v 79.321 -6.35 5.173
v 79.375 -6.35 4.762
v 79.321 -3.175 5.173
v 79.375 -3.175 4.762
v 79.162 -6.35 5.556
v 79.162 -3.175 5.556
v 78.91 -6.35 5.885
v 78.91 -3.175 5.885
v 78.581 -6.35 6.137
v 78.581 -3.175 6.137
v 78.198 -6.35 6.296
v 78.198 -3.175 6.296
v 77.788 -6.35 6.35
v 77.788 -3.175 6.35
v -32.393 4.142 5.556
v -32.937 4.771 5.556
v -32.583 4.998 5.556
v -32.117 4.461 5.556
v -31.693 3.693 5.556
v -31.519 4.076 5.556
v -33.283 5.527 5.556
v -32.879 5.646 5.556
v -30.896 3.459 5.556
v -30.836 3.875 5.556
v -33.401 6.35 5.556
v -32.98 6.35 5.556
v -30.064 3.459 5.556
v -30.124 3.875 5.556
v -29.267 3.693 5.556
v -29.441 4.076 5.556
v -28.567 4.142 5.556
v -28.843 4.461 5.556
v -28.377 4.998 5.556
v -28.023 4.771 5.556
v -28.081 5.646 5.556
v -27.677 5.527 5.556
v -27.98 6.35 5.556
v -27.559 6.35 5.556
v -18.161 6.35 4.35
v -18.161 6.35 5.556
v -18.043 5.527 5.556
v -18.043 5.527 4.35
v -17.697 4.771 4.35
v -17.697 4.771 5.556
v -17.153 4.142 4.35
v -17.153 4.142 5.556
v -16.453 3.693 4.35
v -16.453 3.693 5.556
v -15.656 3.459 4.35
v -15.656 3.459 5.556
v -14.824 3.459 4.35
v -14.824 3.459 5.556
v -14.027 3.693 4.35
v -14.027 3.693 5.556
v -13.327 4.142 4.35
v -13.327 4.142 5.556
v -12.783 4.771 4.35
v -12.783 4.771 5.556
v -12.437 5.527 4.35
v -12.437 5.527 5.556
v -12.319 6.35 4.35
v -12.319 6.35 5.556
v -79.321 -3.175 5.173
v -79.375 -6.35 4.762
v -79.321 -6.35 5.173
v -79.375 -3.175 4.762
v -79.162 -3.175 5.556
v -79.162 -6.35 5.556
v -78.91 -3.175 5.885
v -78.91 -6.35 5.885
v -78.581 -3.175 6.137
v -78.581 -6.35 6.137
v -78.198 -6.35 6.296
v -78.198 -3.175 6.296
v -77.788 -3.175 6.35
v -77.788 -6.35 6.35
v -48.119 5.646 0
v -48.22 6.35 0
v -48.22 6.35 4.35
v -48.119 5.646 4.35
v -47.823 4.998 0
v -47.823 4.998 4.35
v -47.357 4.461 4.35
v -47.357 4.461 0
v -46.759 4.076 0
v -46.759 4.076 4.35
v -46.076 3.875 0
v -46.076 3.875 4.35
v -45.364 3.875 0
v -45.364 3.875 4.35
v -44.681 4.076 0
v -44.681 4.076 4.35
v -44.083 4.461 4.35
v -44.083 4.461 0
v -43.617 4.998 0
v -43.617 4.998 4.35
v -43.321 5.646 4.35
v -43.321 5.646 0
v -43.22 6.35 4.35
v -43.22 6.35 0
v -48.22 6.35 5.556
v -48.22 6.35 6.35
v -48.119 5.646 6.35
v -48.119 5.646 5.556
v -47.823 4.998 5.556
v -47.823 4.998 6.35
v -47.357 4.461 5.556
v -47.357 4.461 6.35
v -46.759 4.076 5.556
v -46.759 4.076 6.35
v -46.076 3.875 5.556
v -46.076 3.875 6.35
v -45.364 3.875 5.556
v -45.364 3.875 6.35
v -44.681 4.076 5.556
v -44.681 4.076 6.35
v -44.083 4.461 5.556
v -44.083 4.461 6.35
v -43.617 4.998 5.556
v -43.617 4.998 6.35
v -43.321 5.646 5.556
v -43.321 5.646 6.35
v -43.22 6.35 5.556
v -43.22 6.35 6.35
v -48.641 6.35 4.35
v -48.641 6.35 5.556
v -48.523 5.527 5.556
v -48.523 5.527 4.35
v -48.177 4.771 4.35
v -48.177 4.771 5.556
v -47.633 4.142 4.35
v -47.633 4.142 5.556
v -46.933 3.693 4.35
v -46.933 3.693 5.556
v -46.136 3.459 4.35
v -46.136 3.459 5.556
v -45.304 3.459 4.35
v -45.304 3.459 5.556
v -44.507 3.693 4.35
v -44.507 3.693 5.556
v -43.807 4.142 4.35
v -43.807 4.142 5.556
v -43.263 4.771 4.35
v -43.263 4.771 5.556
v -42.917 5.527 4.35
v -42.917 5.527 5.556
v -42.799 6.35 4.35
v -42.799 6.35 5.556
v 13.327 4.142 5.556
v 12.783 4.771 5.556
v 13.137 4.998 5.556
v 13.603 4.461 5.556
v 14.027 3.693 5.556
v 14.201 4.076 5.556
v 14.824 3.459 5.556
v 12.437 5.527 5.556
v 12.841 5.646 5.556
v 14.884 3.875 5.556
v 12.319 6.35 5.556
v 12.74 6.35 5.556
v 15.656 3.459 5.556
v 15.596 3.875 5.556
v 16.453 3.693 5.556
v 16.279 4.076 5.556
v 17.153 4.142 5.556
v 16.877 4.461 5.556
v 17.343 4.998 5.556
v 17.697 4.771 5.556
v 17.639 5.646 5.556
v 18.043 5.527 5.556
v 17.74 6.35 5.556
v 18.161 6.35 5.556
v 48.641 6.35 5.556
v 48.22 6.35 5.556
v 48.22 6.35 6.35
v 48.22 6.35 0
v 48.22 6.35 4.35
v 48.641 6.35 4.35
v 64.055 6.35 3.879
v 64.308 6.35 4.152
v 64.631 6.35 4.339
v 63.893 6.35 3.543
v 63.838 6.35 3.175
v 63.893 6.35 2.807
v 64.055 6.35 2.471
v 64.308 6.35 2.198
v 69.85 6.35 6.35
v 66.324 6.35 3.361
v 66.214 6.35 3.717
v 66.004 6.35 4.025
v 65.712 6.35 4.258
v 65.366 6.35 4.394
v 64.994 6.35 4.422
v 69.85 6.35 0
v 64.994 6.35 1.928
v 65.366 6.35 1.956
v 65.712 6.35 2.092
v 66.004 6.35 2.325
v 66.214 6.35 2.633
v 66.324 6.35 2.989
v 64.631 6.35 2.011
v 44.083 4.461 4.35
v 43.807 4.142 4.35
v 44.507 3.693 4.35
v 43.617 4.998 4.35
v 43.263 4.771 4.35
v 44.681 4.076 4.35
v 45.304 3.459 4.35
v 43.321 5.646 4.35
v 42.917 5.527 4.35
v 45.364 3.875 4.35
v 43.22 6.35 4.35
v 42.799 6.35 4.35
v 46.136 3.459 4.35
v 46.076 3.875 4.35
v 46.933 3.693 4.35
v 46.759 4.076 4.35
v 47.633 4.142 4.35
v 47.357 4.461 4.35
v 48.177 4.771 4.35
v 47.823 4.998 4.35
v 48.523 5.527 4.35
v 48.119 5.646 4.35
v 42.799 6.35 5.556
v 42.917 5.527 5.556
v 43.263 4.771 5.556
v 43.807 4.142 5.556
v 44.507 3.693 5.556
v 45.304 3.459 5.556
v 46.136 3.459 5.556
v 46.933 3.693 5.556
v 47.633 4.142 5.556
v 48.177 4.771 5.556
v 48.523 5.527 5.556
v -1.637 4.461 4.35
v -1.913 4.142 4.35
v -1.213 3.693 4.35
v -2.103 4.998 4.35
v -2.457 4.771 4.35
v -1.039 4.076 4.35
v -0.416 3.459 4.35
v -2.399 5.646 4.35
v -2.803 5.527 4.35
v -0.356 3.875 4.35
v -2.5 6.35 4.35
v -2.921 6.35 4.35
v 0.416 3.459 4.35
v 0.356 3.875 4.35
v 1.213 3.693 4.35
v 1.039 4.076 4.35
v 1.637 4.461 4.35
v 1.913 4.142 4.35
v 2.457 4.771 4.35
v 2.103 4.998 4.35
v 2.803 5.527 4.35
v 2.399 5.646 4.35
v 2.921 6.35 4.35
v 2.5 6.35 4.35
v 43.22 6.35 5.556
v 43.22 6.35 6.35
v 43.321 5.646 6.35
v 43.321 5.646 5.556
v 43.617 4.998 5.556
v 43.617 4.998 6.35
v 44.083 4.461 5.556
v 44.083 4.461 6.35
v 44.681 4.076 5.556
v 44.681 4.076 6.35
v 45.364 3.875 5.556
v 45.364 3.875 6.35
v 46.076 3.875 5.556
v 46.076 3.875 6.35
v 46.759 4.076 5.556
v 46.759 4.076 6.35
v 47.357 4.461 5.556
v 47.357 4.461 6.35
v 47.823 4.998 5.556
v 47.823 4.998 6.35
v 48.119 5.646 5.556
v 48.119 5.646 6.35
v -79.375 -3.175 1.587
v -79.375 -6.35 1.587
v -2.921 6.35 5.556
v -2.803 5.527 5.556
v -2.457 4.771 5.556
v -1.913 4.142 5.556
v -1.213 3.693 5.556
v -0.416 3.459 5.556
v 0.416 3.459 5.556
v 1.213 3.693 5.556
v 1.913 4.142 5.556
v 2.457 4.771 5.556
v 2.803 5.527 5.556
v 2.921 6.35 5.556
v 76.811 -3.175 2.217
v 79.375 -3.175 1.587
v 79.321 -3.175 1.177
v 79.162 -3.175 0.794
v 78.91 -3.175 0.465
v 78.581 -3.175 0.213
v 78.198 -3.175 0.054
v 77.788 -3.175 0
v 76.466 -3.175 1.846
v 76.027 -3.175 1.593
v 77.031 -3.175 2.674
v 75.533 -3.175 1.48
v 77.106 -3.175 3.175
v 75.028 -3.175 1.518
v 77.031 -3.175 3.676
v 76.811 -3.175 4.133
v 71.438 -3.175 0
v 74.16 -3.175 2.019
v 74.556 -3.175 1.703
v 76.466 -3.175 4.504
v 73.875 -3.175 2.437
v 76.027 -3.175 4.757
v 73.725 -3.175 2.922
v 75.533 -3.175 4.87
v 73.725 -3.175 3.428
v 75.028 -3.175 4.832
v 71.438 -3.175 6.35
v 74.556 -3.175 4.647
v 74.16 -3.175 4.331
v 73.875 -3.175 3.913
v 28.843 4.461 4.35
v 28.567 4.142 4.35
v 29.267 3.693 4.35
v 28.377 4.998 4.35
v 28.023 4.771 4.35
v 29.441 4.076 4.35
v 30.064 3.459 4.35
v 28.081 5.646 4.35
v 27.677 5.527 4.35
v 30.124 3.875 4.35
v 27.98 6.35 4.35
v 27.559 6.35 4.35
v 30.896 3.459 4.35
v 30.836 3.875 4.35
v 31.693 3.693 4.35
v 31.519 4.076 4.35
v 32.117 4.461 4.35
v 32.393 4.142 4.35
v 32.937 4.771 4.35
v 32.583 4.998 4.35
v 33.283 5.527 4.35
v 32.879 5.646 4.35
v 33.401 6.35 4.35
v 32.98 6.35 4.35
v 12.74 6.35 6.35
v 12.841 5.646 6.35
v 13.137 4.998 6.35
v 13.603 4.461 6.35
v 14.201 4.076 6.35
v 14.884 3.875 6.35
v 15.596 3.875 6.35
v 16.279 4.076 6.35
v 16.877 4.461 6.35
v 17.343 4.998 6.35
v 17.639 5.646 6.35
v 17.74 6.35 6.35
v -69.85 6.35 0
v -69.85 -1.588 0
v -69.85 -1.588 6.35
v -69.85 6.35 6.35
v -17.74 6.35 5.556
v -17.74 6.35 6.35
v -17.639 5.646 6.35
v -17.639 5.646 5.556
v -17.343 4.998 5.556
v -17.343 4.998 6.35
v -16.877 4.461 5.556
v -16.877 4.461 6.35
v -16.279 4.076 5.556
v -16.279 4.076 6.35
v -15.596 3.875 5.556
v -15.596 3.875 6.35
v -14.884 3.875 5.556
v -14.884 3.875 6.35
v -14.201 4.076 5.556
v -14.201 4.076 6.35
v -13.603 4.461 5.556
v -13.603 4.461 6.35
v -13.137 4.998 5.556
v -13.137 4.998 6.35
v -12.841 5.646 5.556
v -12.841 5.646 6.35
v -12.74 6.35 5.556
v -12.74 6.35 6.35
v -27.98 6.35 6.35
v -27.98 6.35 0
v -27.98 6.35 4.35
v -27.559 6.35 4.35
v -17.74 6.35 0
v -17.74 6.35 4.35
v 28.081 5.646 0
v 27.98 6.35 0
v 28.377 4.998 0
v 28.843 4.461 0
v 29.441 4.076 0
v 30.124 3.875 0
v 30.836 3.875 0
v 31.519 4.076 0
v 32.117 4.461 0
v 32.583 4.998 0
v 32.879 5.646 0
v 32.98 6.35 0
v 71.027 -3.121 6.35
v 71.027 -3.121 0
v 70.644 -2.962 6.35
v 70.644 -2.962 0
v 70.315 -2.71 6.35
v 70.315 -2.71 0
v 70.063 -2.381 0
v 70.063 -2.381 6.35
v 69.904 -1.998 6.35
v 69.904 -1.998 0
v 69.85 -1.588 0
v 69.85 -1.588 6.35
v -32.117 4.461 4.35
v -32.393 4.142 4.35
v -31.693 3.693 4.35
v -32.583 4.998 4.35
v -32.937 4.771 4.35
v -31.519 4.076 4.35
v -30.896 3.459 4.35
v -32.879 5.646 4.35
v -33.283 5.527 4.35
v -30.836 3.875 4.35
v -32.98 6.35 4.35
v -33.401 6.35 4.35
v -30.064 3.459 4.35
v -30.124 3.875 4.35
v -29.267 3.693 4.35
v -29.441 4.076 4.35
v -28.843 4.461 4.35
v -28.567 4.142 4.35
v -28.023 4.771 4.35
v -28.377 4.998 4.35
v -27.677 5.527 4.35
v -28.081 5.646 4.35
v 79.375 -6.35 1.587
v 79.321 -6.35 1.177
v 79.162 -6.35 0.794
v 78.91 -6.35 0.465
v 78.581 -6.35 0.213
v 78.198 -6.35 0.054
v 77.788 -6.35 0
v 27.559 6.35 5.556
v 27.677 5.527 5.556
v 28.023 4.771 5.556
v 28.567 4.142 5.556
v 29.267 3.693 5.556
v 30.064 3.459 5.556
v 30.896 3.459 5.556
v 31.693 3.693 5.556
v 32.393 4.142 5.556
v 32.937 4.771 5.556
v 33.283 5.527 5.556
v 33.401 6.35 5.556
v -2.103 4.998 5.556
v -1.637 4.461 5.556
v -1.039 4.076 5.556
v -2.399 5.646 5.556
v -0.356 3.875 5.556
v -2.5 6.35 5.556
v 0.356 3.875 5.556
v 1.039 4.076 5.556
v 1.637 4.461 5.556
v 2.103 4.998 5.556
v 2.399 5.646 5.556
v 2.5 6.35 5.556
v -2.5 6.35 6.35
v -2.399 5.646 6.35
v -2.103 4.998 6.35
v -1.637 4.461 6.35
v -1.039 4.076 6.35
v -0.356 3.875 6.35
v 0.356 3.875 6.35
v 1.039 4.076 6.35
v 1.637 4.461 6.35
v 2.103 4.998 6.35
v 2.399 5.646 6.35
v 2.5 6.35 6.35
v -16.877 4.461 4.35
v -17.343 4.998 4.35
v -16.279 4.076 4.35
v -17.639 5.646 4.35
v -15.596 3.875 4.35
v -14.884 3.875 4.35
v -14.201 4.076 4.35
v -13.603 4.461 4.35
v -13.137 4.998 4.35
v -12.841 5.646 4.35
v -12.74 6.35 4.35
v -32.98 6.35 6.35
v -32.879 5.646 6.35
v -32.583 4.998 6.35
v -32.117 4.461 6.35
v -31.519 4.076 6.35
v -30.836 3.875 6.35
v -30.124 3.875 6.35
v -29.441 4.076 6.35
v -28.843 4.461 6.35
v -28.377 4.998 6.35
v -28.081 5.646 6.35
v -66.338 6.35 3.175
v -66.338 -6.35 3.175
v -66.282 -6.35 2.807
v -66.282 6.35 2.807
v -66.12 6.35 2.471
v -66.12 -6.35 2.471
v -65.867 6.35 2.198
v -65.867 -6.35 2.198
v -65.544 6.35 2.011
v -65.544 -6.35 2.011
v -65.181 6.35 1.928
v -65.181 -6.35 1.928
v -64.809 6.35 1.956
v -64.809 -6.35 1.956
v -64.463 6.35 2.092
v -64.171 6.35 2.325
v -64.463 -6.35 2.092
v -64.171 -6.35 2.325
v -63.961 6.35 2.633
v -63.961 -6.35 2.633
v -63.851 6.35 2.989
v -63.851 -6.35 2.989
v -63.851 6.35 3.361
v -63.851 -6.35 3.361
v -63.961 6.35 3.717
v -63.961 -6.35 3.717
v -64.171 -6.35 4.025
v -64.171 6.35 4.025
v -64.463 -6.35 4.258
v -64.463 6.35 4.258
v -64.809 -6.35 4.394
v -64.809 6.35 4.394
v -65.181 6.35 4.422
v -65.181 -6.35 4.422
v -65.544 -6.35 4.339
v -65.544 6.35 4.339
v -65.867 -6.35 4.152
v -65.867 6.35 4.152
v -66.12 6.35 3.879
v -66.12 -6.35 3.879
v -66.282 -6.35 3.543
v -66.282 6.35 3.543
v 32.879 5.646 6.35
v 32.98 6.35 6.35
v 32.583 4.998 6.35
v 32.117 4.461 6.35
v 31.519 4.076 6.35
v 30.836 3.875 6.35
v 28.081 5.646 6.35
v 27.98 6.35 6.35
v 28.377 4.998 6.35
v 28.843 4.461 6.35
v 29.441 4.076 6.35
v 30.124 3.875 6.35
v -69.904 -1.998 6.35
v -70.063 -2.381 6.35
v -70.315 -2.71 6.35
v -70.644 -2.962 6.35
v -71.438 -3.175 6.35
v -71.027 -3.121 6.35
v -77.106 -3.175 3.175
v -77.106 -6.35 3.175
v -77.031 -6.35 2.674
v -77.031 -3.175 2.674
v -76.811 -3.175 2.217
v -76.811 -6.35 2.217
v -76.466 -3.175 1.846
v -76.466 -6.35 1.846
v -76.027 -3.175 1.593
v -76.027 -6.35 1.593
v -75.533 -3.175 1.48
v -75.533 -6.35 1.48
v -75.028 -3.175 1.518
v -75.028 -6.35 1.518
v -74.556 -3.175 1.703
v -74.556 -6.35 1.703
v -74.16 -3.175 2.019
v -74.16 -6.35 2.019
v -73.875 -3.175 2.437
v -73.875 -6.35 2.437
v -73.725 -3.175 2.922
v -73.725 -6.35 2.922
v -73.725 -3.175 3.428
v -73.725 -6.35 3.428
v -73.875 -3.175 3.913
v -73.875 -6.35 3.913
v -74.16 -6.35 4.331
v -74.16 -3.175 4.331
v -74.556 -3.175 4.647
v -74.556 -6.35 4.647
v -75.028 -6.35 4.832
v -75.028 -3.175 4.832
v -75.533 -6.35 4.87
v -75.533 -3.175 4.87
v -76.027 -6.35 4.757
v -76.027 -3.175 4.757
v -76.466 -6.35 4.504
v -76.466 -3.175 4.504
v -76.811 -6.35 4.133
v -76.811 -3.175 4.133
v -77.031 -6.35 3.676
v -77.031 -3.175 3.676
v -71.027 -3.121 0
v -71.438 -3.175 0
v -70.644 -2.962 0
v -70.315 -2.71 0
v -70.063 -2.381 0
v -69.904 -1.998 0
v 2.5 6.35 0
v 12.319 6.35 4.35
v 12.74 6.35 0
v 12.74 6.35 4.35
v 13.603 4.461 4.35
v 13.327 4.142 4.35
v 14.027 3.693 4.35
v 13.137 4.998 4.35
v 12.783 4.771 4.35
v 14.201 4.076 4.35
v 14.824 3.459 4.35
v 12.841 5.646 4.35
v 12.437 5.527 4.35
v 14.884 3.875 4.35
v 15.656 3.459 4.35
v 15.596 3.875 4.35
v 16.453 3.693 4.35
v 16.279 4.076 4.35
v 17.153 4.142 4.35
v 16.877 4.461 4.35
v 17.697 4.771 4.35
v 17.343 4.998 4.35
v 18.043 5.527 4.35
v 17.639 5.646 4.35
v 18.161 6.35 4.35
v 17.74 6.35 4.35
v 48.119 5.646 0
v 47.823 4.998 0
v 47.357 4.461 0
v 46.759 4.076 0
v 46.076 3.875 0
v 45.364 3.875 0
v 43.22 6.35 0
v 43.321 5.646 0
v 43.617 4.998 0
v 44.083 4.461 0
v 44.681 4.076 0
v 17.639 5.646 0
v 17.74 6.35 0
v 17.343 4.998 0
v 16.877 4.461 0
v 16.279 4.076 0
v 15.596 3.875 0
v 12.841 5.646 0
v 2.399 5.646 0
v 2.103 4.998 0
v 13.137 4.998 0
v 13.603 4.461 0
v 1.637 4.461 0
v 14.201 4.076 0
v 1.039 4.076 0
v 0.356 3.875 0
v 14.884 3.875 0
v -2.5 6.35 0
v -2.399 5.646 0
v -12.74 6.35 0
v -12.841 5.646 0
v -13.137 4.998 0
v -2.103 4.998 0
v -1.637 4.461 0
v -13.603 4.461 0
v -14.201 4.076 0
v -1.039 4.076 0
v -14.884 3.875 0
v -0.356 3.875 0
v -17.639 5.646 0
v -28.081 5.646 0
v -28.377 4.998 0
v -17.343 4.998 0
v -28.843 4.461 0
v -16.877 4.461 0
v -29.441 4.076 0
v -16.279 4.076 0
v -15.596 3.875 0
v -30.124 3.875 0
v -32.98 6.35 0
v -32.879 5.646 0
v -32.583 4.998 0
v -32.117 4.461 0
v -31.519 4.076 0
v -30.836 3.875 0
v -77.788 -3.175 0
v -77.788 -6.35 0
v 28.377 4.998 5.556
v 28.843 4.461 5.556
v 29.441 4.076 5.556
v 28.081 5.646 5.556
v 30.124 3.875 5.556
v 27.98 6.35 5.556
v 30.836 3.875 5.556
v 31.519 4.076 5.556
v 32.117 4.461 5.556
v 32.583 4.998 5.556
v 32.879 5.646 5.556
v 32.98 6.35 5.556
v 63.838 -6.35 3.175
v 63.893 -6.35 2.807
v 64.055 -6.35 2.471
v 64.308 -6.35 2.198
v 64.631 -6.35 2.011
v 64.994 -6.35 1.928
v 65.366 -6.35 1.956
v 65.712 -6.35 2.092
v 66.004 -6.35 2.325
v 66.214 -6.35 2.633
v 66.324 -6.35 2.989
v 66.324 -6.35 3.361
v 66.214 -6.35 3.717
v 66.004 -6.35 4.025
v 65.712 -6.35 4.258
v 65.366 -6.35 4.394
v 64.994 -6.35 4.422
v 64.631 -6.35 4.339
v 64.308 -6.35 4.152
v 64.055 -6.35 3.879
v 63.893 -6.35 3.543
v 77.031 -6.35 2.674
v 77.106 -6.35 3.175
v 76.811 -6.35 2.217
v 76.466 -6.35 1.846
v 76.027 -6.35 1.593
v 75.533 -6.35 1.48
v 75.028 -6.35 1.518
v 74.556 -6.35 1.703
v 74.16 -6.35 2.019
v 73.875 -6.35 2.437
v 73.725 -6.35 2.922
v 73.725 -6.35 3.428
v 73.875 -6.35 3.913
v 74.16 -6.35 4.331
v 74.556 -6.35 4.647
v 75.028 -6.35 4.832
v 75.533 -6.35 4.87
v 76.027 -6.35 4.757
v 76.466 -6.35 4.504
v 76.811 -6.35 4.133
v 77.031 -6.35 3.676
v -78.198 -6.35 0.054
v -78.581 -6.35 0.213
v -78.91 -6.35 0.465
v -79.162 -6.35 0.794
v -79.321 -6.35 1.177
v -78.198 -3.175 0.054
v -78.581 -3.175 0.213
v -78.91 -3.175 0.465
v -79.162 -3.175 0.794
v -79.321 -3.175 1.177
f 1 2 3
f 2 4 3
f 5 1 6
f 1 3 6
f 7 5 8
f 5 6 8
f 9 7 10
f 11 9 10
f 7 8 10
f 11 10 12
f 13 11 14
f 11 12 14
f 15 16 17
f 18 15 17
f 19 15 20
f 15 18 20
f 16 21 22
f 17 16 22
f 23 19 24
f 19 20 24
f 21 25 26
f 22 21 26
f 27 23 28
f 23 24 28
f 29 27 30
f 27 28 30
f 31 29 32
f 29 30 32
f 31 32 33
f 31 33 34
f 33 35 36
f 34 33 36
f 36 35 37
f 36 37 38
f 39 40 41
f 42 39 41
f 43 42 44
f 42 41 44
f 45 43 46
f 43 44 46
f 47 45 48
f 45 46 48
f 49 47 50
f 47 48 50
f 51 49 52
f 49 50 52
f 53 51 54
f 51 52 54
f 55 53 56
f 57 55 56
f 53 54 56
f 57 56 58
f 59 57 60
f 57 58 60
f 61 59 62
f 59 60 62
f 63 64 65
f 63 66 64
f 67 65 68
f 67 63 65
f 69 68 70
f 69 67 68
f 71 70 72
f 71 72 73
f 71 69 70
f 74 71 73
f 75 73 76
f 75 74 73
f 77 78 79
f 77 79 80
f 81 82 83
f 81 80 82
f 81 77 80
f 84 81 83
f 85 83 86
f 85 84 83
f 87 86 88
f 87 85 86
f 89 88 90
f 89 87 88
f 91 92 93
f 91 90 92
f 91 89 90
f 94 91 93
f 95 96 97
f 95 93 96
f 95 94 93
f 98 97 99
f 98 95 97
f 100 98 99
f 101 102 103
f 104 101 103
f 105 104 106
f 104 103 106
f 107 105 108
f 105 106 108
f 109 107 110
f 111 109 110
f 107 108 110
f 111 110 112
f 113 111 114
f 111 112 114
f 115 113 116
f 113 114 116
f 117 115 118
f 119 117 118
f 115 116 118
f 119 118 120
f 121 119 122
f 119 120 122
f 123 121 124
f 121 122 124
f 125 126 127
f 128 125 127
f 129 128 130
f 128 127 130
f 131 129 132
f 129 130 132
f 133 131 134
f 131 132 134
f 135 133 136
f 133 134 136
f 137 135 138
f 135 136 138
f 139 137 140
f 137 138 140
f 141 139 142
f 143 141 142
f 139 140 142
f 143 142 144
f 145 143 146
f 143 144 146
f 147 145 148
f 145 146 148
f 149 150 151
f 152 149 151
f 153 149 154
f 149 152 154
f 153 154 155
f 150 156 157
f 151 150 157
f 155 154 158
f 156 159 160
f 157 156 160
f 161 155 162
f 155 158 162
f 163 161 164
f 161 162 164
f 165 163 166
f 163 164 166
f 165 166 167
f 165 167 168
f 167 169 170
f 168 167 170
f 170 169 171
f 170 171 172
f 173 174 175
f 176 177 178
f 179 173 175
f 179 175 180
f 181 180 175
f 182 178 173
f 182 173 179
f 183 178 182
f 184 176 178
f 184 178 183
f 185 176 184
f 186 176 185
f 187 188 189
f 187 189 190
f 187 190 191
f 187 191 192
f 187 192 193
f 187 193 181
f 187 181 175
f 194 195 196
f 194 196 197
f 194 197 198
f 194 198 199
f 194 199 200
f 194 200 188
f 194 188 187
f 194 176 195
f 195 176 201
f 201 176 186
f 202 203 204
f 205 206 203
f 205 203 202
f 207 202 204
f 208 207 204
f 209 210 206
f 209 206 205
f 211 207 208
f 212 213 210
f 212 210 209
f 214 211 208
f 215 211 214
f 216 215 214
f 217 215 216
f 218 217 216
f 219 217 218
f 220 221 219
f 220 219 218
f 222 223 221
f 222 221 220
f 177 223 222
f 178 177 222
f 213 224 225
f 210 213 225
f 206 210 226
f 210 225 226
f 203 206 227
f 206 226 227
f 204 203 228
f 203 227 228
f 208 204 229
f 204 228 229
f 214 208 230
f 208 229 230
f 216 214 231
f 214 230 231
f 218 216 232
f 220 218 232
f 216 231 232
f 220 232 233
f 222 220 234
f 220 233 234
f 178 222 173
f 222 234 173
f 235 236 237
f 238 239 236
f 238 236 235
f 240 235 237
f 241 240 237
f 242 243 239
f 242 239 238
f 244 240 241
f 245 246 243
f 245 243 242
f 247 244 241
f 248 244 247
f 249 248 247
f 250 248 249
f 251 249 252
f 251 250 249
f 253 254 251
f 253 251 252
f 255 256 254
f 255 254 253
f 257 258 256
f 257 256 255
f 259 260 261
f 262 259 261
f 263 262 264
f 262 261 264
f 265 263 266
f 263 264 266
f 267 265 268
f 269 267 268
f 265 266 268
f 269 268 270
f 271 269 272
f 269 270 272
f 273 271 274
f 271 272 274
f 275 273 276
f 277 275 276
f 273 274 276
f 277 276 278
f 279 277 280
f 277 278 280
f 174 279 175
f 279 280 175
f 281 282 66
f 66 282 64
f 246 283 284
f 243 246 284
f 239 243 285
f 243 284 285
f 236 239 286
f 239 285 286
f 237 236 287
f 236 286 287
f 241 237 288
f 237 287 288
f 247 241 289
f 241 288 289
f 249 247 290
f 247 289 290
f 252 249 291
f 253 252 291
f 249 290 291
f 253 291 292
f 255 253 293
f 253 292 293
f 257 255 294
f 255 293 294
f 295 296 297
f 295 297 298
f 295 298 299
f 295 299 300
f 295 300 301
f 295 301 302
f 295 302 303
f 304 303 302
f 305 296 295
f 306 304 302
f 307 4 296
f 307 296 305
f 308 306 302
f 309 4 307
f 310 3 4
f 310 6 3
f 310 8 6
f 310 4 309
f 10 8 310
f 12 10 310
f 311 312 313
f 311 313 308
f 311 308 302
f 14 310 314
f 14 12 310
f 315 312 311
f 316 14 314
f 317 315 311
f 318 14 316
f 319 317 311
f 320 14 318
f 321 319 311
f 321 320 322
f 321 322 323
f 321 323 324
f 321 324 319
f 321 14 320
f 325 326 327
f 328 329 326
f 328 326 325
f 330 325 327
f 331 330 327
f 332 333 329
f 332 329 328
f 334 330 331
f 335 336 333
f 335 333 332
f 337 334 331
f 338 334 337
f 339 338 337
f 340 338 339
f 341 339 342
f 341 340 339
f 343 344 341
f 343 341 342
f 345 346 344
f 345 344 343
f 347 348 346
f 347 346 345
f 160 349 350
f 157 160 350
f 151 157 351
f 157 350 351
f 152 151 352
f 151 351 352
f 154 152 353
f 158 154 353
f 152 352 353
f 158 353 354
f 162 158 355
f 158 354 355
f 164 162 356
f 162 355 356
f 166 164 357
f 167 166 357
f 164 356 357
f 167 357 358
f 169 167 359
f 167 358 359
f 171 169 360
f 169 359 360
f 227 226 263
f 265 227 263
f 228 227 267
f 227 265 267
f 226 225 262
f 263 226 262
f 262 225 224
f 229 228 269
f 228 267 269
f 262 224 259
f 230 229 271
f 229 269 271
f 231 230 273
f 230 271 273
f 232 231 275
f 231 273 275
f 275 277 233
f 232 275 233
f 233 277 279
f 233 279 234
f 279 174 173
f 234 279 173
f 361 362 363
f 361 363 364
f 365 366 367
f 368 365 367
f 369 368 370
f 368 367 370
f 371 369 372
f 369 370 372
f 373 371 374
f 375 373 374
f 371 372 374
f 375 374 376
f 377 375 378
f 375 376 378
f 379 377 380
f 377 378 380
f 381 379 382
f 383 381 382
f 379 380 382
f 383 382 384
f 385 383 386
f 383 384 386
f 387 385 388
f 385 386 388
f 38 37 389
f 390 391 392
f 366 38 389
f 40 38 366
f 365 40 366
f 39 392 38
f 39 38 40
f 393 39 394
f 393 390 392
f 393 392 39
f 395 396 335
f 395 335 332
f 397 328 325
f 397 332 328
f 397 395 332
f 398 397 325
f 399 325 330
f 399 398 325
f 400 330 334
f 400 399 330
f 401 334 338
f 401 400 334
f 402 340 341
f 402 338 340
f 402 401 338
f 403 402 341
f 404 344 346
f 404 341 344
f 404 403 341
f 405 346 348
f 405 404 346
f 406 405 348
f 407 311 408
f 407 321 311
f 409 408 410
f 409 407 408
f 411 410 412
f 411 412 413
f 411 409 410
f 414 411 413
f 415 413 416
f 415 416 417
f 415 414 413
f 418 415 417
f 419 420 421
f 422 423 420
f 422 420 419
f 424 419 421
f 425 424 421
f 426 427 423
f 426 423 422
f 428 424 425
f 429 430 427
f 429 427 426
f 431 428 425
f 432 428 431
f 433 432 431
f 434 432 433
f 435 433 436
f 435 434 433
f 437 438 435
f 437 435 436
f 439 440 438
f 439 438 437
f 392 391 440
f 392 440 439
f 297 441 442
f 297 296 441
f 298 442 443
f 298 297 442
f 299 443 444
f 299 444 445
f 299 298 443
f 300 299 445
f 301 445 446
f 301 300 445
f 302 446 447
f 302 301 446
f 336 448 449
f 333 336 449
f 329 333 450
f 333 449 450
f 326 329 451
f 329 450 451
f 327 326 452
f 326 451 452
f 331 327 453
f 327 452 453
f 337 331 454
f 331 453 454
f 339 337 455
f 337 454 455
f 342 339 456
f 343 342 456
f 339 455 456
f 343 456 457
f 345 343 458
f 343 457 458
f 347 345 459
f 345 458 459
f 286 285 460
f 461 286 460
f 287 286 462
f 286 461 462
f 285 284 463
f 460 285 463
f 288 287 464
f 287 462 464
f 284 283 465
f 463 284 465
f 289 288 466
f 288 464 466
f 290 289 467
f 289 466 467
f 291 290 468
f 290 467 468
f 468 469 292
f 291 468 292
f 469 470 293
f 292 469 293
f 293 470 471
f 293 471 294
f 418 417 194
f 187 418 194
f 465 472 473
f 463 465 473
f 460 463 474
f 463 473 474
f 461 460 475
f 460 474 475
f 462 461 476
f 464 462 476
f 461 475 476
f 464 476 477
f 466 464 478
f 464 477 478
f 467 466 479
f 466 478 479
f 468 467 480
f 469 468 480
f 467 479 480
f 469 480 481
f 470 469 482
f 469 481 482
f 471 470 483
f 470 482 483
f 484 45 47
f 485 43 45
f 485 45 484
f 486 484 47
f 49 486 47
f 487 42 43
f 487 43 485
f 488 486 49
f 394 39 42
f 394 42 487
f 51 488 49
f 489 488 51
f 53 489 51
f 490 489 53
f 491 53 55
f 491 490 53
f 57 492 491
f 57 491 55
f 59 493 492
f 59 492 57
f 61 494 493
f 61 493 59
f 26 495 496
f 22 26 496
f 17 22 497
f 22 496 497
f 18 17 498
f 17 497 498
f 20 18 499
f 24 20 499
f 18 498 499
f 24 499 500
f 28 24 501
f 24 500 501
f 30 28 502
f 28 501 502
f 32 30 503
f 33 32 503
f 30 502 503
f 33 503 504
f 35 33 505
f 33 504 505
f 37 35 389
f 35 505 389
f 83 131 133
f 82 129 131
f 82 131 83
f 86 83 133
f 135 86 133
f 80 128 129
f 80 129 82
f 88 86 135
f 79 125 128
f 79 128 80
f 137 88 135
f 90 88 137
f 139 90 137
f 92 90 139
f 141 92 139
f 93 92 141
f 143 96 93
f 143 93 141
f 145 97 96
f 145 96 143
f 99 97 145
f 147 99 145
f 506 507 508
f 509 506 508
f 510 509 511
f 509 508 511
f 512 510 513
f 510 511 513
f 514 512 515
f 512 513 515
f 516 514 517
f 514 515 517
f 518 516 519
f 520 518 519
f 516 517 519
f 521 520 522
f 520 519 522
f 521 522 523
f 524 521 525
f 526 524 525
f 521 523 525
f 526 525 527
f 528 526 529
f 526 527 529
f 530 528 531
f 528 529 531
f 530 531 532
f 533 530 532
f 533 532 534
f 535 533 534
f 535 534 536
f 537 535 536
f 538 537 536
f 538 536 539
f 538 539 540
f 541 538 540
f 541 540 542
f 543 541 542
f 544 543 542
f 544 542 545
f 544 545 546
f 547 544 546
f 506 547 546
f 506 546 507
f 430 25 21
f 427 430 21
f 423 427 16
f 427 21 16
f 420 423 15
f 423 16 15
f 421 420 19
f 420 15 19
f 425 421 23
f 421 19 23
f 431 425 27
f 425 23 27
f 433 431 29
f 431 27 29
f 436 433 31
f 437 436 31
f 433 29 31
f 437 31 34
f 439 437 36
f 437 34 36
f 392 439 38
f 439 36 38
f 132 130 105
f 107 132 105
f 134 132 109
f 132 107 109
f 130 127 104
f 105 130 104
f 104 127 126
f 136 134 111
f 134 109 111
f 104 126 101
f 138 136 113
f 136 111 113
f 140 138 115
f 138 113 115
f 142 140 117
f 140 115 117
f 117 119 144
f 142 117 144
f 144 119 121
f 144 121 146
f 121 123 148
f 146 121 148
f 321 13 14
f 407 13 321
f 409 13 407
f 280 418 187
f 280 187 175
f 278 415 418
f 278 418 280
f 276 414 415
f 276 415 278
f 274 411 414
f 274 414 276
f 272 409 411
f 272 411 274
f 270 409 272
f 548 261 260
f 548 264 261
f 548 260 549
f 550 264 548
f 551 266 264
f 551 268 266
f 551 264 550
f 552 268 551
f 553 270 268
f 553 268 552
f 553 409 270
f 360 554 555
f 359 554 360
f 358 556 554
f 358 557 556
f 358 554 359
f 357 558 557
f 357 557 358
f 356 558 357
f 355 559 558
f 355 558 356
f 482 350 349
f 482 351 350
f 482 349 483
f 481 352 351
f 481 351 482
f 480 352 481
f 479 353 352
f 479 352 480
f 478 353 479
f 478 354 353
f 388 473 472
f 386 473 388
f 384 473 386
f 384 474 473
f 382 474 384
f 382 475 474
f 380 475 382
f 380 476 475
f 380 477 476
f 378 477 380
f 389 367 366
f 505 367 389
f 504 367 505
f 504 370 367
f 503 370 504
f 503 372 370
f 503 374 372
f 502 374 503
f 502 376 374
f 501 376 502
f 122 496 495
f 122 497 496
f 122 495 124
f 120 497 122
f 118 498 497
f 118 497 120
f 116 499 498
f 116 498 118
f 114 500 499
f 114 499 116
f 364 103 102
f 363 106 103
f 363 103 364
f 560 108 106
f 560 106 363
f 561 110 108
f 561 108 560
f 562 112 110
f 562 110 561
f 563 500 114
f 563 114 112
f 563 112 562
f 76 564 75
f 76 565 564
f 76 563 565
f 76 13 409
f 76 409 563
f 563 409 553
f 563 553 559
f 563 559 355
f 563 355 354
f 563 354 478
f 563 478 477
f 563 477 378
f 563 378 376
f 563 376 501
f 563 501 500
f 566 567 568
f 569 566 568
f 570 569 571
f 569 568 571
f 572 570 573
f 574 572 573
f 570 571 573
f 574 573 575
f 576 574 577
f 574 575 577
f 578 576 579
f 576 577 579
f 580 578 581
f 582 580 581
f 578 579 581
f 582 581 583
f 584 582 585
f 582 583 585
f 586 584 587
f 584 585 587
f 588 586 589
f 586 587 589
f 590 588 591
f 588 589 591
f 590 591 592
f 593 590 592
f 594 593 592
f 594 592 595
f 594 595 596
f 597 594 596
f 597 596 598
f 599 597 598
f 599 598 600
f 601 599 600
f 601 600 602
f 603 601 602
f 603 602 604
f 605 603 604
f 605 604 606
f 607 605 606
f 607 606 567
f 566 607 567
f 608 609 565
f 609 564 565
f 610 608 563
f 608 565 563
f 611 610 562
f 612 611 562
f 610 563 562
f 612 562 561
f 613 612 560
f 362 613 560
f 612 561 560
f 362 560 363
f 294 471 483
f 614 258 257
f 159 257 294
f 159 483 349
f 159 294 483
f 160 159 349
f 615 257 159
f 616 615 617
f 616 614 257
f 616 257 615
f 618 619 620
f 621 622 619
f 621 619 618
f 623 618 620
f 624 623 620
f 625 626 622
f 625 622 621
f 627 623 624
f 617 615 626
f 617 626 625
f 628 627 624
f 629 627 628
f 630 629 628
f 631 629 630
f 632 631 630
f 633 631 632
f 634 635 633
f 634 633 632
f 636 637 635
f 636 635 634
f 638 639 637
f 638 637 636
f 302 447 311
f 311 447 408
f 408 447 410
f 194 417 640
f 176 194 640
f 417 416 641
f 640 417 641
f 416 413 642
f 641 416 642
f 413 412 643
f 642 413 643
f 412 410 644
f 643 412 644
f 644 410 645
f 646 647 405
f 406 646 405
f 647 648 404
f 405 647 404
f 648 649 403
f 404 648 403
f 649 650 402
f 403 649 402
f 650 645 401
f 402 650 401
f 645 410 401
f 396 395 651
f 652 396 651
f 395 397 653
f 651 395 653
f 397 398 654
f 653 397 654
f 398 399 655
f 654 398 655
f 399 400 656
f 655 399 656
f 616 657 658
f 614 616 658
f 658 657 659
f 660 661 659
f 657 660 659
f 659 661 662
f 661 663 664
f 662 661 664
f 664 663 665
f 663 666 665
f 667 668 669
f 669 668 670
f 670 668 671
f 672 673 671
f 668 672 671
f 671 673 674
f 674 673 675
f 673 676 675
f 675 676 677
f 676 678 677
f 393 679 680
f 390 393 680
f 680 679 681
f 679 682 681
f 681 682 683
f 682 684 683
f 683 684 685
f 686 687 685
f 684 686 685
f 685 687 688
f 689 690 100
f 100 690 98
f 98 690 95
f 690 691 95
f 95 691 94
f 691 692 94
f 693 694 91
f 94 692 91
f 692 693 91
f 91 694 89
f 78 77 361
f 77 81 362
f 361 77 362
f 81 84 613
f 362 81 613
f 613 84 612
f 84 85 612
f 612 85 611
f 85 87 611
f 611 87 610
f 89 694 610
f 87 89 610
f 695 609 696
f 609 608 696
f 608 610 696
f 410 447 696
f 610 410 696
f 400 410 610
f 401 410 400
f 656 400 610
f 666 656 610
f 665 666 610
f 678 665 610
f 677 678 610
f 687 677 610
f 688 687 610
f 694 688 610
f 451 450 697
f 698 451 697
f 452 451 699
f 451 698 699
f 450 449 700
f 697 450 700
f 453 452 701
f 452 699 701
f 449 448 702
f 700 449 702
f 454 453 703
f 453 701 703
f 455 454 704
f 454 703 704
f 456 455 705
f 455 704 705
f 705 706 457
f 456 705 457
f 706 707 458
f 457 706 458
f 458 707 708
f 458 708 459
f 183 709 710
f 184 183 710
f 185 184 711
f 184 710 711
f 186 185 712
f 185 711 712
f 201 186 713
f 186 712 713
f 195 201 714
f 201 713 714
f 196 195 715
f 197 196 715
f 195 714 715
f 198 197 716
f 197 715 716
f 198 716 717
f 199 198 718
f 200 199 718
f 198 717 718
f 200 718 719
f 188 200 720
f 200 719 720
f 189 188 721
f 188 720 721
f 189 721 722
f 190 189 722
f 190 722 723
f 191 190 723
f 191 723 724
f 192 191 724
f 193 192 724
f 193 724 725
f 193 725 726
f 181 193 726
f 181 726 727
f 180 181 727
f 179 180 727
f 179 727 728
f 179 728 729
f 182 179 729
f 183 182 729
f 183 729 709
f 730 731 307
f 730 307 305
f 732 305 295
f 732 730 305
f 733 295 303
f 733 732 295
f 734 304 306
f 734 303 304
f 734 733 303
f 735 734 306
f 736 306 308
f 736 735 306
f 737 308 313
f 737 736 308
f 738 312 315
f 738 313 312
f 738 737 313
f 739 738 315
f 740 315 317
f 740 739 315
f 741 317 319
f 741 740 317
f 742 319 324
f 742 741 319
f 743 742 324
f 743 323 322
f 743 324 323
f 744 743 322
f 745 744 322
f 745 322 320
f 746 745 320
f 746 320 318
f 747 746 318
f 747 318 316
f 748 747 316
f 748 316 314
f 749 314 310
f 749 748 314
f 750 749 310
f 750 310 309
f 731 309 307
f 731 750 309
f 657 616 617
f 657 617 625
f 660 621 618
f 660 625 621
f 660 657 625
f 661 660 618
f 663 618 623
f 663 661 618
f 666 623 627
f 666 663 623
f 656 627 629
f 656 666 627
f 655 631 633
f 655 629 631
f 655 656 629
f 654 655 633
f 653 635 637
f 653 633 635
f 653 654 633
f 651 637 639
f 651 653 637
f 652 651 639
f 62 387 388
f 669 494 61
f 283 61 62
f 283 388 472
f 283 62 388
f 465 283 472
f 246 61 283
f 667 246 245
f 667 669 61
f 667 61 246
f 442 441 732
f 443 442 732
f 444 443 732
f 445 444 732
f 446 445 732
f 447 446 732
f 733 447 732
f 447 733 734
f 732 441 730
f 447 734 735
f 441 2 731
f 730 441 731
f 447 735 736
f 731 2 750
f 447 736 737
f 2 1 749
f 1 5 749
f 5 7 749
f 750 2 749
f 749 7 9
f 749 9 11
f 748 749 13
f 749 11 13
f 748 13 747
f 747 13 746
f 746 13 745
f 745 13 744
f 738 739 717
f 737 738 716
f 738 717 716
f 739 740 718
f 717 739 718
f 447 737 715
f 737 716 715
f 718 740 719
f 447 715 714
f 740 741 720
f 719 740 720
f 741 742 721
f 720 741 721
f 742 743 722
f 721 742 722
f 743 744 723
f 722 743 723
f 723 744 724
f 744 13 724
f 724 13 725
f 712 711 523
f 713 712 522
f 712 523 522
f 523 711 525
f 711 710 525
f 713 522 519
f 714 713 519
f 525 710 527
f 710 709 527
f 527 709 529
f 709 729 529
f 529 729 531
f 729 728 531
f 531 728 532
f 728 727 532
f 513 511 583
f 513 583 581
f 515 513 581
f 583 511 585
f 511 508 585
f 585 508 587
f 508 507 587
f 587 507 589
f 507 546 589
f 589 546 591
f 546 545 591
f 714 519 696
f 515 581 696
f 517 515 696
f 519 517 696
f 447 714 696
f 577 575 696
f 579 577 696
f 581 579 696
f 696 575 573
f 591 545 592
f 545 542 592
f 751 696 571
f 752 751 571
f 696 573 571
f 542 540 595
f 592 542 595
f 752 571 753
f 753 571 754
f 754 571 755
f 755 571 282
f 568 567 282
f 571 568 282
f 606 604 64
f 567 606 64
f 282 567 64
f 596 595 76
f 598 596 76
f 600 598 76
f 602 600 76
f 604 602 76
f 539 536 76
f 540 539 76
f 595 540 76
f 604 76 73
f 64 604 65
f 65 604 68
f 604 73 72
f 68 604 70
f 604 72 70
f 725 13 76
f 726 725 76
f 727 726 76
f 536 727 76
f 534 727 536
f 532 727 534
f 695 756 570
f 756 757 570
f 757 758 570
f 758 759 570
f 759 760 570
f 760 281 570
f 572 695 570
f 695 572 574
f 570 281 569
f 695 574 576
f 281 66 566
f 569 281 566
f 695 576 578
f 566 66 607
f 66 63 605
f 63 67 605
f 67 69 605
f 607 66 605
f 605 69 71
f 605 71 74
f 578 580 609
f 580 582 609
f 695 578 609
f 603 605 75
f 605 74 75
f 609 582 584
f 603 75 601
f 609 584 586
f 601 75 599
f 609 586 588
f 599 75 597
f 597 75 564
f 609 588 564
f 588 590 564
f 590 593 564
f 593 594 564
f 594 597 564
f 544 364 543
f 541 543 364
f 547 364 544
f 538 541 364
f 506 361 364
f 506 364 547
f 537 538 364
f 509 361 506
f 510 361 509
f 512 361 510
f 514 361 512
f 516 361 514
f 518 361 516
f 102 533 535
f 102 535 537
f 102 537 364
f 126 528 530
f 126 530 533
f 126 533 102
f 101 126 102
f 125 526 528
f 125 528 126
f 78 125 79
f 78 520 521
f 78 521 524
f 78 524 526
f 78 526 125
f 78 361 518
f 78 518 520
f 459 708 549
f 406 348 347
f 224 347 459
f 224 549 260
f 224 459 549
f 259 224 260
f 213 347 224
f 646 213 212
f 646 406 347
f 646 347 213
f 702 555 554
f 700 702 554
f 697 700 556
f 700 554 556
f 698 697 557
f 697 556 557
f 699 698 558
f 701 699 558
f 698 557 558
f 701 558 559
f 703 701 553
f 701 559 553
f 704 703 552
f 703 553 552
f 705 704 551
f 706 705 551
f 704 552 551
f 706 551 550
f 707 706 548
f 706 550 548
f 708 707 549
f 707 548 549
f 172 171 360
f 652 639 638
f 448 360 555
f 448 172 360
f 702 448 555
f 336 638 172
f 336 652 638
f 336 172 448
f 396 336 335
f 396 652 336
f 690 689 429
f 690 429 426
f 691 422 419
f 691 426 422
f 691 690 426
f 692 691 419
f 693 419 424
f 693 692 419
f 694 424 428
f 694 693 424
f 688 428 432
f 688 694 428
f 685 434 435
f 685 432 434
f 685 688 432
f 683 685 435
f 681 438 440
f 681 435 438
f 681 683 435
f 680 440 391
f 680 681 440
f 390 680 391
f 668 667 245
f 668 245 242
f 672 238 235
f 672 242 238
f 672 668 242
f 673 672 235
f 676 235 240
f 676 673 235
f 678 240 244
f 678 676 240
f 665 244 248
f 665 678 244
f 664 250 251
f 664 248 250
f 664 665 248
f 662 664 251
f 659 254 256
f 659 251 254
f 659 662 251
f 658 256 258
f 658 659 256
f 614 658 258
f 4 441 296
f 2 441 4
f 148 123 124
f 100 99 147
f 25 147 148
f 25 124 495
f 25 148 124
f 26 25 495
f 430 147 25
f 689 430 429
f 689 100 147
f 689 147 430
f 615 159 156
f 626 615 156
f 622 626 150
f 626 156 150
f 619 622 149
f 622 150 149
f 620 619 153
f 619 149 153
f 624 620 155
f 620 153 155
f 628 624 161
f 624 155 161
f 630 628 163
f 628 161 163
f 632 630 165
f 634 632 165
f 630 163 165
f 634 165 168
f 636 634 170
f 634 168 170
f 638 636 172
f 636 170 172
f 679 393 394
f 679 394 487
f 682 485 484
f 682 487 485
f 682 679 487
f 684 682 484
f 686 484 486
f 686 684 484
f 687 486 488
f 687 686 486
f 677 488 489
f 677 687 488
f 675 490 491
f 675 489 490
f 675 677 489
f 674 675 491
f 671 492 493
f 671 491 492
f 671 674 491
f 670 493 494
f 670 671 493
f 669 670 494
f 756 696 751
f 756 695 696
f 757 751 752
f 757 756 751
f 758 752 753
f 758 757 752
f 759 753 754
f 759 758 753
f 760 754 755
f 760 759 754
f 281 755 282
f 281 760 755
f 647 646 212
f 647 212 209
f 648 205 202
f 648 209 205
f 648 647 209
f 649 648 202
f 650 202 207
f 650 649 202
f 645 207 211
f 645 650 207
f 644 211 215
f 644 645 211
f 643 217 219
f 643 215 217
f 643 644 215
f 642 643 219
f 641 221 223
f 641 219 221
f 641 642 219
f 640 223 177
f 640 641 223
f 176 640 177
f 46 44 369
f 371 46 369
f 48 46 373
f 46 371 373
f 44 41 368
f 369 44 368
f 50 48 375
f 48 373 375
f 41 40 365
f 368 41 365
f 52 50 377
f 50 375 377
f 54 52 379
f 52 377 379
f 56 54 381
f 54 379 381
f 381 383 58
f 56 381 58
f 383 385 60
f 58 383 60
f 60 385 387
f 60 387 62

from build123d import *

# Parameters (mm, degrees)
SKETCH1_W                   = 139.7
SKETCH1_H                   = 12.7
BOSS_EXTRUDE1_DEPTH         = 6.35
TAP_DRILL_FOR_M3X0_5_TAP1_D = 2.5
SKETCH5_W                   = 9.525
SKETCH5_H                   = 6.35
BOSS_EXTRUDE2_DEPTH         = 3.175
FILLET1_R                   = 1.5875
M3_CLEARANCE_HOLE1_D        = 3.4
FILLET2_R                   = 1.5875
FILLET2_OF_MIRROR5_R        = 1.5875
FILLET3_R                   = 1.5875
SKETCH14_R                  = 2.5
CUT_EXTRUDE2_DEPTH          = 0.79375
SKETCH15_R                  = 2.921
CUT_EXTRUDE3_DEPTH          = 1.2065
CUT_EXTRUDE4_START          = -5.34975
CUT_EXTRUDE4_DEPTH          = 8.35
LPATTERN1_COUNT             = 4
LPATTERN1_PITCH             = 15.24
LPATTERN2_COUNT             = 4
LPATTERN2_PITCH             = 15.24


with BuildPart() as part:
    # Sketch1 → Boss-Extrude1 (new body)
    with BuildSketch(Plane.XY):
        Rectangle(SKETCH1_W, SKETCH1_H)
    extrude(amount=BOSS_EXTRUDE1_DEPTH)

    # Tap Drill for M3x0.5 Tap1 (through all)
    with Locations(Plane(origin=(0, 6.35, 0), x_dir=(1, 0, 0), z_dir=(0, 1, 0))):
        with Locations((-65.0875, -3.175), (65.0875, -3.175)):
            Hole(TAP_DRILL_FOR_M3X0_5_TAP1_D / 2)

    # Sketch5 → Boss-Extrude2 (add)
    with BuildSketch(Plane.XZ.offset(6.35)):
        with Locations((-74.6125, 3.175)):
            Rectangle(SKETCH5_W, SKETCH5_H)
    boss_extrude2 = extrude(amount=-BOSS_EXTRUDE2_DEPTH)

    # Fillet1
    fillet1_edges = [part.edges().sort_by_distance(p)[0] for p in [
        (-69.85, -3.175, 3.175),
    ]]
    fillet(fillet1_edges, radius=FILLET1_R)

    # M3 Clearance Hole1 (through all)
    with Locations(Plane(origin=(0, -3.175, 0), x_dir=(1, 0, 0), z_dir=(0, 1, 0))):
        with Locations((-75.40625, -3.175)):
            m3_clearance_hole1 = Hole(M3_CLEARANCE_HOLE1_D / 2)

    # Fillet2
    fillet2_edges = [part.edges().sort_by_distance(p)[0] for p in [
        (-79.375, -4.7625, 0),
        (-79.375, -4.7625, 6.35),
    ]]
    fillet(fillet2_edges, radius=FILLET2_R)

    # Mirror5: Boss-Extrude2, M3 Clearance Hole1 across plane
    add(boss_extrude2.mirror(Plane(origin=(0, 0, 0), x_dir=(0, 0, 1), z_dir=(1, 0, 0))))
    add(m3_clearance_hole1.mirror(Plane(origin=(0, 0, 0), x_dir=(0, 0, 1), z_dir=(1, 0, 0))), mode=Mode.SUBTRACT)

    # Fillet2 of Mirror5
    fillet2_of_mirror5_edges = [part.edges().sort_by_distance(p)[0] for p in [
        (79.375, -4.7625, 0),
        (79.375, -4.7625, 6.35),
    ]]
    fillet(fillet2_of_mirror5_edges, radius=FILLET2_OF_MIRROR5_R)

    # Fillet3
    fillet3_edges = [part.edges().sort_by_distance(p)[0] for p in [
        (69.85, -3.175, 3.175),
    ]]
    fillet(fillet3_edges, radius=FILLET3_R)

    # Sketch14 → Cut-Extrude2 (cut)
    with BuildSketch(Plane.XY.offset(6.35)):
        with Locations((0, 6.35)):
            Circle(SKETCH14_R)
    cut_extrude2 = extrude(amount=-CUT_EXTRUDE2_DEPTH, mode=Mode.SUBTRACT)

    # Sketch15 → Cut-Extrude3 (cut)
    with BuildSketch(Plane.XY.offset(5.55625)):
        with Locations((0, 6.35)):
            Circle(SKETCH15_R)
    cut_extrude3 = extrude(amount=-CUT_EXTRUDE3_DEPTH, mode=Mode.SUBTRACT)

    # Sketch16 → Cut-Extrude4 (cut)
    with BuildSketch(Plane.XY.offset(4.34975).offset(CUT_EXTRUDE4_START)):
        with BuildLine():
            Line((-2.5, 182.058245118), (-2.5, 6.35))
            ThreePointArc((-2.5, 6.35), (0, 3.85), (2.5, 6.35))
            Line((2.5, 6.35), (2.5, 182.058245118))
            Line((2.5, 182.058245118), (2.5, 533.474735353))
            Line((2.5, 533.474735353), (-2.5, 533.474735353))
            Line((-2.5, 533.474735353), (-2.5, 182.058245118))
        make_face()
    cut_extrude4 = extrude(amount=CUT_EXTRUDE4_DEPTH, mode=Mode.SUBTRACT)

    # LPattern1: Cut-Extrude2, Cut-Extrude3, Cut-Extrude4 ×4
    with Locations(*[(i * LPATTERN1_PITCH, 0, 0) for i in range(1, LPATTERN1_COUNT)]):
        add(cut_extrude2, mode=Mode.SUBTRACT)
        add(cut_extrude3, mode=Mode.SUBTRACT)
        add(cut_extrude4, mode=Mode.SUBTRACT)

    # LPattern2: Cut-Extrude2, Cut-Extrude3, Cut-Extrude4 ×4
    with Locations(*[(-i * LPATTERN2_PITCH, 0, 0) for i in range(1, LPATTERN2_COUNT)]):
        add(cut_extrude2, mode=Mode.SUBTRACT)
        add(cut_extrude3, mode=Mode.SUBTRACT)
        add(cut_extrude4, mode=Mode.SUBTRACT)


solid = part.part
